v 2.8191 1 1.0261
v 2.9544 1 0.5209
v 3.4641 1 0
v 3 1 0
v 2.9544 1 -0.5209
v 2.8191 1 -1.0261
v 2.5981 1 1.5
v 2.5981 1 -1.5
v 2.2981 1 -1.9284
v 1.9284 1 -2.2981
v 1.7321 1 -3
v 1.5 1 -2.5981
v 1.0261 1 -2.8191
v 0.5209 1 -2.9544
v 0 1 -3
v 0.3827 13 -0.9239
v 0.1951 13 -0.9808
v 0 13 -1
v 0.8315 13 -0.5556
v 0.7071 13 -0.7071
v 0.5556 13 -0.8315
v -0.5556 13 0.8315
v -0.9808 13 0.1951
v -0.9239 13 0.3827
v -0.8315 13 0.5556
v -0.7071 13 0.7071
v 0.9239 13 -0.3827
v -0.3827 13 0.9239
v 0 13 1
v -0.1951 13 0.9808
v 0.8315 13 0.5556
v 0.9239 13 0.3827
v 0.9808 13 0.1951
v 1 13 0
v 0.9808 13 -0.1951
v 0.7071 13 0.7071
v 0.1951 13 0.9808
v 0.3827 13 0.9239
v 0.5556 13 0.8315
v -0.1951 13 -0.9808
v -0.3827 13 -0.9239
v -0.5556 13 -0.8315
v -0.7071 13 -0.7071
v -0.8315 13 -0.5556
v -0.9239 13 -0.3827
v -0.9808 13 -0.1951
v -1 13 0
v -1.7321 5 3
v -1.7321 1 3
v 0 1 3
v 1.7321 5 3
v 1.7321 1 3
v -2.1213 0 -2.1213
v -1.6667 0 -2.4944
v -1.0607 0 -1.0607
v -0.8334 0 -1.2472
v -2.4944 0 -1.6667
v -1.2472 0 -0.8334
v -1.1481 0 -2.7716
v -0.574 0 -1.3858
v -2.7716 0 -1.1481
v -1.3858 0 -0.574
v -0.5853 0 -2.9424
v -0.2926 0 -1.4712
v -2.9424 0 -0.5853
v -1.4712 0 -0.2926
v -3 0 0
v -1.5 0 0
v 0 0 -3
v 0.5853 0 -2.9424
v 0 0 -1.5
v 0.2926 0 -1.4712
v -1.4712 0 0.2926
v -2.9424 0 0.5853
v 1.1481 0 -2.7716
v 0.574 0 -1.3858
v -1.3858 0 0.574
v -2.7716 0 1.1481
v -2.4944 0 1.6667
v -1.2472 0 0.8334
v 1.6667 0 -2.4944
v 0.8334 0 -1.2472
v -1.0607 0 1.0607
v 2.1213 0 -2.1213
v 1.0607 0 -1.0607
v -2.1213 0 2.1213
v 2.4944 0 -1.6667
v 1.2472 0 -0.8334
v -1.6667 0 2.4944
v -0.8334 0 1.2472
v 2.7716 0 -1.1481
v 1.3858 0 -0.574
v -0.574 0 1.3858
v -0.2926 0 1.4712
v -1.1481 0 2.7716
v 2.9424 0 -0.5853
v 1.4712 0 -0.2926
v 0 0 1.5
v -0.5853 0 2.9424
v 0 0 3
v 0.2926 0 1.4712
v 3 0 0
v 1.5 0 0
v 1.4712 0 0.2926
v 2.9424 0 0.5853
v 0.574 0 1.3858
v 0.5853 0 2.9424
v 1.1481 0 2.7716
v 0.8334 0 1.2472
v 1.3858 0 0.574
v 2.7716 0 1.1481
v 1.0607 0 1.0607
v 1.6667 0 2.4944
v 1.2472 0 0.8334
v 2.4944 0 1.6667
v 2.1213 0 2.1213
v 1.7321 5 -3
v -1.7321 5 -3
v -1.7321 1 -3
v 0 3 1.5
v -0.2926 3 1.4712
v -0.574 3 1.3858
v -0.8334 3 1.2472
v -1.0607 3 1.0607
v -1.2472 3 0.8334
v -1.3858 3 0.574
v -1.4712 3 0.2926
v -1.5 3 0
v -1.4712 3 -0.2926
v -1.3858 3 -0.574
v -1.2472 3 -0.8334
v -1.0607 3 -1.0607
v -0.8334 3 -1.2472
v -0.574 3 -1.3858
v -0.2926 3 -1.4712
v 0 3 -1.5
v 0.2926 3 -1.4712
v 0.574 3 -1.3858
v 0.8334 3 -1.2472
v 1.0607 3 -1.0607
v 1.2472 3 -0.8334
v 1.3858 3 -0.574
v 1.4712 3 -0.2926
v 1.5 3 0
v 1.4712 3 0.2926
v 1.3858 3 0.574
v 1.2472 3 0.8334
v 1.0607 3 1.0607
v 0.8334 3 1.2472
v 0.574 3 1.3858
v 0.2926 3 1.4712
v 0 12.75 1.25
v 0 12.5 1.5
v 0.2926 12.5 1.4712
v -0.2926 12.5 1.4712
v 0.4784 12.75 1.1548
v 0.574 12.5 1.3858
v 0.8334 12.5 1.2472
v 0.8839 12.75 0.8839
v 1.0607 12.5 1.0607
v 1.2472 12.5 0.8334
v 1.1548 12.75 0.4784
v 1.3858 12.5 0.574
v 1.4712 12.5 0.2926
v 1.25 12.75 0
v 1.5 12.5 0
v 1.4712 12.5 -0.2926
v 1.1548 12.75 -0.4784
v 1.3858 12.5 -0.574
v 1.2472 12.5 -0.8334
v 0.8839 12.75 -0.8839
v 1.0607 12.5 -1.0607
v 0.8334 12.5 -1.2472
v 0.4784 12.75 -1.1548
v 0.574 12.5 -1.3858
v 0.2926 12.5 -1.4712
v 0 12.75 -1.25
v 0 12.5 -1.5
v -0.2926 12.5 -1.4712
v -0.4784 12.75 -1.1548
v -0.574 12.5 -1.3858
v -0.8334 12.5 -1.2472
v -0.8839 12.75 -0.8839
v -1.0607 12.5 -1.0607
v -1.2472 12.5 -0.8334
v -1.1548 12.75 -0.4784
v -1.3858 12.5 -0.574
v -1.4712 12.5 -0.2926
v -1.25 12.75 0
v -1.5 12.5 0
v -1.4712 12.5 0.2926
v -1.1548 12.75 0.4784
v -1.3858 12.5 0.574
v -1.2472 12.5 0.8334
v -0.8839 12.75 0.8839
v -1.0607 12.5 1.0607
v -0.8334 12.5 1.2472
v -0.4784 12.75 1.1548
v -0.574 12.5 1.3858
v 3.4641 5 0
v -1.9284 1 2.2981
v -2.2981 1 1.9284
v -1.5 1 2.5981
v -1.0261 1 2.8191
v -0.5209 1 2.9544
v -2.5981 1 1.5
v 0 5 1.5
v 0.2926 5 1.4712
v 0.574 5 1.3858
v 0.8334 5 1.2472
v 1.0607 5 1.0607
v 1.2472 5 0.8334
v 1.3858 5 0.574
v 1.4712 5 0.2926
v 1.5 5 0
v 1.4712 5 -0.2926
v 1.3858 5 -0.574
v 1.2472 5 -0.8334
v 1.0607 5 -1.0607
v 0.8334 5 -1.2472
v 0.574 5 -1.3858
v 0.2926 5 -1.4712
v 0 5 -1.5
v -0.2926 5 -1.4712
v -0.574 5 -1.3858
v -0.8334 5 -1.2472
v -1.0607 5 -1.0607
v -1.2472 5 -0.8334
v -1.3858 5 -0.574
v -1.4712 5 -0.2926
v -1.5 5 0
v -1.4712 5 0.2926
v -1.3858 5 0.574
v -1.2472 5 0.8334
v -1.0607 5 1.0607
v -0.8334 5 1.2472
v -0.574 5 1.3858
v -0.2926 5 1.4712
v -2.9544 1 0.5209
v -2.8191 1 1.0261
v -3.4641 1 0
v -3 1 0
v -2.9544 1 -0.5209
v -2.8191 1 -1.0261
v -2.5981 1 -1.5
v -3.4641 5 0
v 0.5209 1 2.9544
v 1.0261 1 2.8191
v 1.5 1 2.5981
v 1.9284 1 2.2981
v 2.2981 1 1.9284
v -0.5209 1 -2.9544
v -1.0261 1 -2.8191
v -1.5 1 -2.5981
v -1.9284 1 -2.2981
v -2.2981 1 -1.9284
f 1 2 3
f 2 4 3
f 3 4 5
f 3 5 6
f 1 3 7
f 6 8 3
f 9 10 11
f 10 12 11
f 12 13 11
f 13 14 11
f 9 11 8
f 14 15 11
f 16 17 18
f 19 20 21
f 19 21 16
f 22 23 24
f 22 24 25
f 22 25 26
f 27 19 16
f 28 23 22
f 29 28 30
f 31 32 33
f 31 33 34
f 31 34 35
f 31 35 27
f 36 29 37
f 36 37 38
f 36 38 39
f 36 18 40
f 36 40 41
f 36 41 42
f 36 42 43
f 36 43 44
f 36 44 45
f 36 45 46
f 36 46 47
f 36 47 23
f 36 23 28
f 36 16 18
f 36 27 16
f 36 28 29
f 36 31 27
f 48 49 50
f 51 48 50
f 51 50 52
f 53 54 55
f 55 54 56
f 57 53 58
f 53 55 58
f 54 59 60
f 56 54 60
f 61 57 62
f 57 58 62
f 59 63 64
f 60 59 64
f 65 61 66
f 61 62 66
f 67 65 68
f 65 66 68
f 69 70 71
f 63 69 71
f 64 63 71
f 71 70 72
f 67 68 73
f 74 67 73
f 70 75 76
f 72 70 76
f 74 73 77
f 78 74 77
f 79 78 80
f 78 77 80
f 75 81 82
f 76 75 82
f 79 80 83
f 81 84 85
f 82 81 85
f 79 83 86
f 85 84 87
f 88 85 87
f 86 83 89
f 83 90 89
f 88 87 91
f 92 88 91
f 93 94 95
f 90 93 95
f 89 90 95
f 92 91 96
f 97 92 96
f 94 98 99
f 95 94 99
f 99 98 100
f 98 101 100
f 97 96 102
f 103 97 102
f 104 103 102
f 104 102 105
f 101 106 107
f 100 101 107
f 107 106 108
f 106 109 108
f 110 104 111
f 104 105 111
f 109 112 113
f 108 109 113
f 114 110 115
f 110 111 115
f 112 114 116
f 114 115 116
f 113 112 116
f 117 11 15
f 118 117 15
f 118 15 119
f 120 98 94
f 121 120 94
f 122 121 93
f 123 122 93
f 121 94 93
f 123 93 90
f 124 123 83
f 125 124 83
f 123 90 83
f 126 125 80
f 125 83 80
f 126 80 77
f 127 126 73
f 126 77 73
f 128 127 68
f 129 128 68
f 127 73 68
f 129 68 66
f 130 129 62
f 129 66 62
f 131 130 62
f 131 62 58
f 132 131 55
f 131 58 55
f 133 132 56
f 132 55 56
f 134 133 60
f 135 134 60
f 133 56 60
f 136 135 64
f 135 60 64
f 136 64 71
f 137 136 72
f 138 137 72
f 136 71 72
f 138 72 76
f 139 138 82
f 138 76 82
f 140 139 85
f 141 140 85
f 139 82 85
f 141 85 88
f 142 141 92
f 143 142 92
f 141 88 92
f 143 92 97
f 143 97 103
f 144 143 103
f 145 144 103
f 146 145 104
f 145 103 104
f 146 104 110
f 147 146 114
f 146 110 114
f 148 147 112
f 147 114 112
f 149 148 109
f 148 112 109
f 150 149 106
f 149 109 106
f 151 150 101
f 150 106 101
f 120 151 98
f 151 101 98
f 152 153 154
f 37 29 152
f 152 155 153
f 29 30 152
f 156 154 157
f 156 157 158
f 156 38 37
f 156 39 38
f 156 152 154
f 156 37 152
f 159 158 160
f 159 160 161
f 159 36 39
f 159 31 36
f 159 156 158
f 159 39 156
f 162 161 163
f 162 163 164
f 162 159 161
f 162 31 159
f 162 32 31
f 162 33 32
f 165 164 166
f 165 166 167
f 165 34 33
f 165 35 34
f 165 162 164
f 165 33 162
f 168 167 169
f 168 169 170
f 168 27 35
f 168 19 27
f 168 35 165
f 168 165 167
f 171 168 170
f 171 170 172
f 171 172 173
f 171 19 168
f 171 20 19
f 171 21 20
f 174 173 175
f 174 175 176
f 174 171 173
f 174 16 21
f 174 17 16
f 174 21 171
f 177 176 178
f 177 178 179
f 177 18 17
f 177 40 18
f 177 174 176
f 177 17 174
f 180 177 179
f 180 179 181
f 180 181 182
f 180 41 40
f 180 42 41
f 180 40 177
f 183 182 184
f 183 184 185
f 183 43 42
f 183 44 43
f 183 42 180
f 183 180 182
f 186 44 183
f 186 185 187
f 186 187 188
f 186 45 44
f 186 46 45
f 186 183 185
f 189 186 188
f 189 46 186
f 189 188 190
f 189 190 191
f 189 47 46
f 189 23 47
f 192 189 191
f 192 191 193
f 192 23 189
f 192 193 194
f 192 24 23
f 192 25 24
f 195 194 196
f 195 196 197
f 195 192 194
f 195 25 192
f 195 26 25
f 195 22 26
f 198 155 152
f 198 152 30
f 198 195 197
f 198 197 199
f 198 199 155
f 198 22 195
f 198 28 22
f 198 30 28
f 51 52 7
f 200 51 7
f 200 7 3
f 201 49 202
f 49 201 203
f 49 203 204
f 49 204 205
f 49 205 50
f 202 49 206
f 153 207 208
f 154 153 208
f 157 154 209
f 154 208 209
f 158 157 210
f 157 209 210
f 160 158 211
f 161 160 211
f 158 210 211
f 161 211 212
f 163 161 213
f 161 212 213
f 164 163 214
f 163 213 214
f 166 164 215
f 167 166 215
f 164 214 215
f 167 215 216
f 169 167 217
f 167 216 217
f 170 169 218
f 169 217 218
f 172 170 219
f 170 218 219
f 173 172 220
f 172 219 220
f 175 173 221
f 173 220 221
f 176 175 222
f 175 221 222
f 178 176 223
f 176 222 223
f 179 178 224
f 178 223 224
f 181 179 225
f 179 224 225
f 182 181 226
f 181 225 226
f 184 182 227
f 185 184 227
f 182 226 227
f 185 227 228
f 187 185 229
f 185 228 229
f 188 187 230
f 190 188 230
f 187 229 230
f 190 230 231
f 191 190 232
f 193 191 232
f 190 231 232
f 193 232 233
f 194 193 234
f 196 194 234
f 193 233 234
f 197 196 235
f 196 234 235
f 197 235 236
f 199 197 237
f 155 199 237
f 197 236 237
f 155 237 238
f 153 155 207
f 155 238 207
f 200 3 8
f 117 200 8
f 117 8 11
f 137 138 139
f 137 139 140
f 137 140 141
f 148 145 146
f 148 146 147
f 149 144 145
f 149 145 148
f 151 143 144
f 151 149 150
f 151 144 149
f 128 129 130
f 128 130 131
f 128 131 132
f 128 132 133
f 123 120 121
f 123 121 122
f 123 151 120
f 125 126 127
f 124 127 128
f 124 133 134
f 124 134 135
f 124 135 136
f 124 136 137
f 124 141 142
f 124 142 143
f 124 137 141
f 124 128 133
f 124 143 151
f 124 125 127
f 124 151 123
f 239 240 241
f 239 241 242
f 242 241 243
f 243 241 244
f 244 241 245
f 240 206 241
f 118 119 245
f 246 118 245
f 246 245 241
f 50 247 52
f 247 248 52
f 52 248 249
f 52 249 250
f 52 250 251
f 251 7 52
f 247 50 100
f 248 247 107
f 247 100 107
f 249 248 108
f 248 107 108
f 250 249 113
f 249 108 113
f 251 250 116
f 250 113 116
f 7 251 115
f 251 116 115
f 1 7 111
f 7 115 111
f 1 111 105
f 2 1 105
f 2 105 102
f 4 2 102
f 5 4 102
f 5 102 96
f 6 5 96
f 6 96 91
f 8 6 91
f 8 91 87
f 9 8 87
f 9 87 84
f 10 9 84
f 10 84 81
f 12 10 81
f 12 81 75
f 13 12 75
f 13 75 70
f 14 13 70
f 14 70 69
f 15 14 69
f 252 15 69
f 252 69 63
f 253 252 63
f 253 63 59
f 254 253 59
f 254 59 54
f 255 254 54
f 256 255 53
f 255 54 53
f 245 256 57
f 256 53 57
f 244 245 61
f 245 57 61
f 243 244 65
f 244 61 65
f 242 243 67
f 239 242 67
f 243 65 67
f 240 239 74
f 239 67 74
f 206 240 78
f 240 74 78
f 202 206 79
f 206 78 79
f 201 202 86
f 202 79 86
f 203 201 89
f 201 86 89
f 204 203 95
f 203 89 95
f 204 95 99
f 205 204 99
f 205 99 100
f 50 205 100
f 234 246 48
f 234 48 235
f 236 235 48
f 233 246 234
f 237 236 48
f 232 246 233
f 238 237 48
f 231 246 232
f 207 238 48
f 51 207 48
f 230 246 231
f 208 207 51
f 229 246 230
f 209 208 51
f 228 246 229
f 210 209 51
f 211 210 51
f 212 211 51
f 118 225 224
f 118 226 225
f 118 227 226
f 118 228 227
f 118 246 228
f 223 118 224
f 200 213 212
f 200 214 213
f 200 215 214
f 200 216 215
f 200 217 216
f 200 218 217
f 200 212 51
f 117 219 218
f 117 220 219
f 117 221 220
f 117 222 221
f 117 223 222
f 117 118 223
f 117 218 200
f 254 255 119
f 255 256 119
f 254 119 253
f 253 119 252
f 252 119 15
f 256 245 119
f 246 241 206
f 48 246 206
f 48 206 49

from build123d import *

# Parameters (mm, degrees)
SKETCH1_R           = 3
BOSS_EXTRUDE1_DEPTH = 1
BOSS_EXTRUDE2_DEPTH = 4
SKETCH3_R           = 1.5
BOSS_EXTRUDE3_DEPTH = 8
CHAMFER1_SIZE       = 0.5
SKETCH4_R           = 1.5
CUT_EXTRUDE1_DEPTH  = 3


with BuildPart() as part:
    # Sketch1 → Boss-Extrude1 (new body)
    with BuildSketch(Plane(origin=(0, 0, 0), x_dir=(1, 0, 0), z_dir=(0, 1, 0))):
        with Locations(Location((0, 0, 0), (0, 0, 270))):
            Circle(SKETCH1_R)
    extrude(amount=BOSS_EXTRUDE1_DEPTH)

    # Sketch2 → Boss-Extrude2 (add)
    with BuildSketch(Plane(origin=(0, 1, 0), x_dir=(1, 0, 0), z_dir=(0, 1, 0))):
        Polygon((3.464101615, 0), (1.732050808, 3), (-1.732050808, 3), (-3.464101615, 0), (-1.732050808, -3), (1.732050808, -3), align=None)
    extrude(amount=BOSS_EXTRUDE2_DEPTH)

    # Sketch3 → Boss-Extrude3 (add)
    with BuildSketch(Plane(origin=(0, 5, 0), x_dir=(1, 0, 0), z_dir=(0, 1, 0))):
        with Locations(Location((0, 0, 0), (0, 0, 270))):
            Circle(SKETCH3_R)
    extrude(amount=BOSS_EXTRUDE3_DEPTH)

    # Chamfer1
    chamfer1_edges = [part.edges().sort_by_distance(p)[0] for p in [
        (0, 13, -1.5),
    ]]
    chamfer(chamfer1_edges, length=CHAMFER1_SIZE)

    # Sketch4 → Cut-Extrude1 (cut)
    with BuildSketch(Plane.XZ):
        with Locations(Location((0, 0, 0), (0, 0, 90))):
            Circle(SKETCH4_R)
    extrude(amount=-CUT_EXTRUDE1_DEPTH, mode=Mode.SUBTRACT)


solid = part.part
